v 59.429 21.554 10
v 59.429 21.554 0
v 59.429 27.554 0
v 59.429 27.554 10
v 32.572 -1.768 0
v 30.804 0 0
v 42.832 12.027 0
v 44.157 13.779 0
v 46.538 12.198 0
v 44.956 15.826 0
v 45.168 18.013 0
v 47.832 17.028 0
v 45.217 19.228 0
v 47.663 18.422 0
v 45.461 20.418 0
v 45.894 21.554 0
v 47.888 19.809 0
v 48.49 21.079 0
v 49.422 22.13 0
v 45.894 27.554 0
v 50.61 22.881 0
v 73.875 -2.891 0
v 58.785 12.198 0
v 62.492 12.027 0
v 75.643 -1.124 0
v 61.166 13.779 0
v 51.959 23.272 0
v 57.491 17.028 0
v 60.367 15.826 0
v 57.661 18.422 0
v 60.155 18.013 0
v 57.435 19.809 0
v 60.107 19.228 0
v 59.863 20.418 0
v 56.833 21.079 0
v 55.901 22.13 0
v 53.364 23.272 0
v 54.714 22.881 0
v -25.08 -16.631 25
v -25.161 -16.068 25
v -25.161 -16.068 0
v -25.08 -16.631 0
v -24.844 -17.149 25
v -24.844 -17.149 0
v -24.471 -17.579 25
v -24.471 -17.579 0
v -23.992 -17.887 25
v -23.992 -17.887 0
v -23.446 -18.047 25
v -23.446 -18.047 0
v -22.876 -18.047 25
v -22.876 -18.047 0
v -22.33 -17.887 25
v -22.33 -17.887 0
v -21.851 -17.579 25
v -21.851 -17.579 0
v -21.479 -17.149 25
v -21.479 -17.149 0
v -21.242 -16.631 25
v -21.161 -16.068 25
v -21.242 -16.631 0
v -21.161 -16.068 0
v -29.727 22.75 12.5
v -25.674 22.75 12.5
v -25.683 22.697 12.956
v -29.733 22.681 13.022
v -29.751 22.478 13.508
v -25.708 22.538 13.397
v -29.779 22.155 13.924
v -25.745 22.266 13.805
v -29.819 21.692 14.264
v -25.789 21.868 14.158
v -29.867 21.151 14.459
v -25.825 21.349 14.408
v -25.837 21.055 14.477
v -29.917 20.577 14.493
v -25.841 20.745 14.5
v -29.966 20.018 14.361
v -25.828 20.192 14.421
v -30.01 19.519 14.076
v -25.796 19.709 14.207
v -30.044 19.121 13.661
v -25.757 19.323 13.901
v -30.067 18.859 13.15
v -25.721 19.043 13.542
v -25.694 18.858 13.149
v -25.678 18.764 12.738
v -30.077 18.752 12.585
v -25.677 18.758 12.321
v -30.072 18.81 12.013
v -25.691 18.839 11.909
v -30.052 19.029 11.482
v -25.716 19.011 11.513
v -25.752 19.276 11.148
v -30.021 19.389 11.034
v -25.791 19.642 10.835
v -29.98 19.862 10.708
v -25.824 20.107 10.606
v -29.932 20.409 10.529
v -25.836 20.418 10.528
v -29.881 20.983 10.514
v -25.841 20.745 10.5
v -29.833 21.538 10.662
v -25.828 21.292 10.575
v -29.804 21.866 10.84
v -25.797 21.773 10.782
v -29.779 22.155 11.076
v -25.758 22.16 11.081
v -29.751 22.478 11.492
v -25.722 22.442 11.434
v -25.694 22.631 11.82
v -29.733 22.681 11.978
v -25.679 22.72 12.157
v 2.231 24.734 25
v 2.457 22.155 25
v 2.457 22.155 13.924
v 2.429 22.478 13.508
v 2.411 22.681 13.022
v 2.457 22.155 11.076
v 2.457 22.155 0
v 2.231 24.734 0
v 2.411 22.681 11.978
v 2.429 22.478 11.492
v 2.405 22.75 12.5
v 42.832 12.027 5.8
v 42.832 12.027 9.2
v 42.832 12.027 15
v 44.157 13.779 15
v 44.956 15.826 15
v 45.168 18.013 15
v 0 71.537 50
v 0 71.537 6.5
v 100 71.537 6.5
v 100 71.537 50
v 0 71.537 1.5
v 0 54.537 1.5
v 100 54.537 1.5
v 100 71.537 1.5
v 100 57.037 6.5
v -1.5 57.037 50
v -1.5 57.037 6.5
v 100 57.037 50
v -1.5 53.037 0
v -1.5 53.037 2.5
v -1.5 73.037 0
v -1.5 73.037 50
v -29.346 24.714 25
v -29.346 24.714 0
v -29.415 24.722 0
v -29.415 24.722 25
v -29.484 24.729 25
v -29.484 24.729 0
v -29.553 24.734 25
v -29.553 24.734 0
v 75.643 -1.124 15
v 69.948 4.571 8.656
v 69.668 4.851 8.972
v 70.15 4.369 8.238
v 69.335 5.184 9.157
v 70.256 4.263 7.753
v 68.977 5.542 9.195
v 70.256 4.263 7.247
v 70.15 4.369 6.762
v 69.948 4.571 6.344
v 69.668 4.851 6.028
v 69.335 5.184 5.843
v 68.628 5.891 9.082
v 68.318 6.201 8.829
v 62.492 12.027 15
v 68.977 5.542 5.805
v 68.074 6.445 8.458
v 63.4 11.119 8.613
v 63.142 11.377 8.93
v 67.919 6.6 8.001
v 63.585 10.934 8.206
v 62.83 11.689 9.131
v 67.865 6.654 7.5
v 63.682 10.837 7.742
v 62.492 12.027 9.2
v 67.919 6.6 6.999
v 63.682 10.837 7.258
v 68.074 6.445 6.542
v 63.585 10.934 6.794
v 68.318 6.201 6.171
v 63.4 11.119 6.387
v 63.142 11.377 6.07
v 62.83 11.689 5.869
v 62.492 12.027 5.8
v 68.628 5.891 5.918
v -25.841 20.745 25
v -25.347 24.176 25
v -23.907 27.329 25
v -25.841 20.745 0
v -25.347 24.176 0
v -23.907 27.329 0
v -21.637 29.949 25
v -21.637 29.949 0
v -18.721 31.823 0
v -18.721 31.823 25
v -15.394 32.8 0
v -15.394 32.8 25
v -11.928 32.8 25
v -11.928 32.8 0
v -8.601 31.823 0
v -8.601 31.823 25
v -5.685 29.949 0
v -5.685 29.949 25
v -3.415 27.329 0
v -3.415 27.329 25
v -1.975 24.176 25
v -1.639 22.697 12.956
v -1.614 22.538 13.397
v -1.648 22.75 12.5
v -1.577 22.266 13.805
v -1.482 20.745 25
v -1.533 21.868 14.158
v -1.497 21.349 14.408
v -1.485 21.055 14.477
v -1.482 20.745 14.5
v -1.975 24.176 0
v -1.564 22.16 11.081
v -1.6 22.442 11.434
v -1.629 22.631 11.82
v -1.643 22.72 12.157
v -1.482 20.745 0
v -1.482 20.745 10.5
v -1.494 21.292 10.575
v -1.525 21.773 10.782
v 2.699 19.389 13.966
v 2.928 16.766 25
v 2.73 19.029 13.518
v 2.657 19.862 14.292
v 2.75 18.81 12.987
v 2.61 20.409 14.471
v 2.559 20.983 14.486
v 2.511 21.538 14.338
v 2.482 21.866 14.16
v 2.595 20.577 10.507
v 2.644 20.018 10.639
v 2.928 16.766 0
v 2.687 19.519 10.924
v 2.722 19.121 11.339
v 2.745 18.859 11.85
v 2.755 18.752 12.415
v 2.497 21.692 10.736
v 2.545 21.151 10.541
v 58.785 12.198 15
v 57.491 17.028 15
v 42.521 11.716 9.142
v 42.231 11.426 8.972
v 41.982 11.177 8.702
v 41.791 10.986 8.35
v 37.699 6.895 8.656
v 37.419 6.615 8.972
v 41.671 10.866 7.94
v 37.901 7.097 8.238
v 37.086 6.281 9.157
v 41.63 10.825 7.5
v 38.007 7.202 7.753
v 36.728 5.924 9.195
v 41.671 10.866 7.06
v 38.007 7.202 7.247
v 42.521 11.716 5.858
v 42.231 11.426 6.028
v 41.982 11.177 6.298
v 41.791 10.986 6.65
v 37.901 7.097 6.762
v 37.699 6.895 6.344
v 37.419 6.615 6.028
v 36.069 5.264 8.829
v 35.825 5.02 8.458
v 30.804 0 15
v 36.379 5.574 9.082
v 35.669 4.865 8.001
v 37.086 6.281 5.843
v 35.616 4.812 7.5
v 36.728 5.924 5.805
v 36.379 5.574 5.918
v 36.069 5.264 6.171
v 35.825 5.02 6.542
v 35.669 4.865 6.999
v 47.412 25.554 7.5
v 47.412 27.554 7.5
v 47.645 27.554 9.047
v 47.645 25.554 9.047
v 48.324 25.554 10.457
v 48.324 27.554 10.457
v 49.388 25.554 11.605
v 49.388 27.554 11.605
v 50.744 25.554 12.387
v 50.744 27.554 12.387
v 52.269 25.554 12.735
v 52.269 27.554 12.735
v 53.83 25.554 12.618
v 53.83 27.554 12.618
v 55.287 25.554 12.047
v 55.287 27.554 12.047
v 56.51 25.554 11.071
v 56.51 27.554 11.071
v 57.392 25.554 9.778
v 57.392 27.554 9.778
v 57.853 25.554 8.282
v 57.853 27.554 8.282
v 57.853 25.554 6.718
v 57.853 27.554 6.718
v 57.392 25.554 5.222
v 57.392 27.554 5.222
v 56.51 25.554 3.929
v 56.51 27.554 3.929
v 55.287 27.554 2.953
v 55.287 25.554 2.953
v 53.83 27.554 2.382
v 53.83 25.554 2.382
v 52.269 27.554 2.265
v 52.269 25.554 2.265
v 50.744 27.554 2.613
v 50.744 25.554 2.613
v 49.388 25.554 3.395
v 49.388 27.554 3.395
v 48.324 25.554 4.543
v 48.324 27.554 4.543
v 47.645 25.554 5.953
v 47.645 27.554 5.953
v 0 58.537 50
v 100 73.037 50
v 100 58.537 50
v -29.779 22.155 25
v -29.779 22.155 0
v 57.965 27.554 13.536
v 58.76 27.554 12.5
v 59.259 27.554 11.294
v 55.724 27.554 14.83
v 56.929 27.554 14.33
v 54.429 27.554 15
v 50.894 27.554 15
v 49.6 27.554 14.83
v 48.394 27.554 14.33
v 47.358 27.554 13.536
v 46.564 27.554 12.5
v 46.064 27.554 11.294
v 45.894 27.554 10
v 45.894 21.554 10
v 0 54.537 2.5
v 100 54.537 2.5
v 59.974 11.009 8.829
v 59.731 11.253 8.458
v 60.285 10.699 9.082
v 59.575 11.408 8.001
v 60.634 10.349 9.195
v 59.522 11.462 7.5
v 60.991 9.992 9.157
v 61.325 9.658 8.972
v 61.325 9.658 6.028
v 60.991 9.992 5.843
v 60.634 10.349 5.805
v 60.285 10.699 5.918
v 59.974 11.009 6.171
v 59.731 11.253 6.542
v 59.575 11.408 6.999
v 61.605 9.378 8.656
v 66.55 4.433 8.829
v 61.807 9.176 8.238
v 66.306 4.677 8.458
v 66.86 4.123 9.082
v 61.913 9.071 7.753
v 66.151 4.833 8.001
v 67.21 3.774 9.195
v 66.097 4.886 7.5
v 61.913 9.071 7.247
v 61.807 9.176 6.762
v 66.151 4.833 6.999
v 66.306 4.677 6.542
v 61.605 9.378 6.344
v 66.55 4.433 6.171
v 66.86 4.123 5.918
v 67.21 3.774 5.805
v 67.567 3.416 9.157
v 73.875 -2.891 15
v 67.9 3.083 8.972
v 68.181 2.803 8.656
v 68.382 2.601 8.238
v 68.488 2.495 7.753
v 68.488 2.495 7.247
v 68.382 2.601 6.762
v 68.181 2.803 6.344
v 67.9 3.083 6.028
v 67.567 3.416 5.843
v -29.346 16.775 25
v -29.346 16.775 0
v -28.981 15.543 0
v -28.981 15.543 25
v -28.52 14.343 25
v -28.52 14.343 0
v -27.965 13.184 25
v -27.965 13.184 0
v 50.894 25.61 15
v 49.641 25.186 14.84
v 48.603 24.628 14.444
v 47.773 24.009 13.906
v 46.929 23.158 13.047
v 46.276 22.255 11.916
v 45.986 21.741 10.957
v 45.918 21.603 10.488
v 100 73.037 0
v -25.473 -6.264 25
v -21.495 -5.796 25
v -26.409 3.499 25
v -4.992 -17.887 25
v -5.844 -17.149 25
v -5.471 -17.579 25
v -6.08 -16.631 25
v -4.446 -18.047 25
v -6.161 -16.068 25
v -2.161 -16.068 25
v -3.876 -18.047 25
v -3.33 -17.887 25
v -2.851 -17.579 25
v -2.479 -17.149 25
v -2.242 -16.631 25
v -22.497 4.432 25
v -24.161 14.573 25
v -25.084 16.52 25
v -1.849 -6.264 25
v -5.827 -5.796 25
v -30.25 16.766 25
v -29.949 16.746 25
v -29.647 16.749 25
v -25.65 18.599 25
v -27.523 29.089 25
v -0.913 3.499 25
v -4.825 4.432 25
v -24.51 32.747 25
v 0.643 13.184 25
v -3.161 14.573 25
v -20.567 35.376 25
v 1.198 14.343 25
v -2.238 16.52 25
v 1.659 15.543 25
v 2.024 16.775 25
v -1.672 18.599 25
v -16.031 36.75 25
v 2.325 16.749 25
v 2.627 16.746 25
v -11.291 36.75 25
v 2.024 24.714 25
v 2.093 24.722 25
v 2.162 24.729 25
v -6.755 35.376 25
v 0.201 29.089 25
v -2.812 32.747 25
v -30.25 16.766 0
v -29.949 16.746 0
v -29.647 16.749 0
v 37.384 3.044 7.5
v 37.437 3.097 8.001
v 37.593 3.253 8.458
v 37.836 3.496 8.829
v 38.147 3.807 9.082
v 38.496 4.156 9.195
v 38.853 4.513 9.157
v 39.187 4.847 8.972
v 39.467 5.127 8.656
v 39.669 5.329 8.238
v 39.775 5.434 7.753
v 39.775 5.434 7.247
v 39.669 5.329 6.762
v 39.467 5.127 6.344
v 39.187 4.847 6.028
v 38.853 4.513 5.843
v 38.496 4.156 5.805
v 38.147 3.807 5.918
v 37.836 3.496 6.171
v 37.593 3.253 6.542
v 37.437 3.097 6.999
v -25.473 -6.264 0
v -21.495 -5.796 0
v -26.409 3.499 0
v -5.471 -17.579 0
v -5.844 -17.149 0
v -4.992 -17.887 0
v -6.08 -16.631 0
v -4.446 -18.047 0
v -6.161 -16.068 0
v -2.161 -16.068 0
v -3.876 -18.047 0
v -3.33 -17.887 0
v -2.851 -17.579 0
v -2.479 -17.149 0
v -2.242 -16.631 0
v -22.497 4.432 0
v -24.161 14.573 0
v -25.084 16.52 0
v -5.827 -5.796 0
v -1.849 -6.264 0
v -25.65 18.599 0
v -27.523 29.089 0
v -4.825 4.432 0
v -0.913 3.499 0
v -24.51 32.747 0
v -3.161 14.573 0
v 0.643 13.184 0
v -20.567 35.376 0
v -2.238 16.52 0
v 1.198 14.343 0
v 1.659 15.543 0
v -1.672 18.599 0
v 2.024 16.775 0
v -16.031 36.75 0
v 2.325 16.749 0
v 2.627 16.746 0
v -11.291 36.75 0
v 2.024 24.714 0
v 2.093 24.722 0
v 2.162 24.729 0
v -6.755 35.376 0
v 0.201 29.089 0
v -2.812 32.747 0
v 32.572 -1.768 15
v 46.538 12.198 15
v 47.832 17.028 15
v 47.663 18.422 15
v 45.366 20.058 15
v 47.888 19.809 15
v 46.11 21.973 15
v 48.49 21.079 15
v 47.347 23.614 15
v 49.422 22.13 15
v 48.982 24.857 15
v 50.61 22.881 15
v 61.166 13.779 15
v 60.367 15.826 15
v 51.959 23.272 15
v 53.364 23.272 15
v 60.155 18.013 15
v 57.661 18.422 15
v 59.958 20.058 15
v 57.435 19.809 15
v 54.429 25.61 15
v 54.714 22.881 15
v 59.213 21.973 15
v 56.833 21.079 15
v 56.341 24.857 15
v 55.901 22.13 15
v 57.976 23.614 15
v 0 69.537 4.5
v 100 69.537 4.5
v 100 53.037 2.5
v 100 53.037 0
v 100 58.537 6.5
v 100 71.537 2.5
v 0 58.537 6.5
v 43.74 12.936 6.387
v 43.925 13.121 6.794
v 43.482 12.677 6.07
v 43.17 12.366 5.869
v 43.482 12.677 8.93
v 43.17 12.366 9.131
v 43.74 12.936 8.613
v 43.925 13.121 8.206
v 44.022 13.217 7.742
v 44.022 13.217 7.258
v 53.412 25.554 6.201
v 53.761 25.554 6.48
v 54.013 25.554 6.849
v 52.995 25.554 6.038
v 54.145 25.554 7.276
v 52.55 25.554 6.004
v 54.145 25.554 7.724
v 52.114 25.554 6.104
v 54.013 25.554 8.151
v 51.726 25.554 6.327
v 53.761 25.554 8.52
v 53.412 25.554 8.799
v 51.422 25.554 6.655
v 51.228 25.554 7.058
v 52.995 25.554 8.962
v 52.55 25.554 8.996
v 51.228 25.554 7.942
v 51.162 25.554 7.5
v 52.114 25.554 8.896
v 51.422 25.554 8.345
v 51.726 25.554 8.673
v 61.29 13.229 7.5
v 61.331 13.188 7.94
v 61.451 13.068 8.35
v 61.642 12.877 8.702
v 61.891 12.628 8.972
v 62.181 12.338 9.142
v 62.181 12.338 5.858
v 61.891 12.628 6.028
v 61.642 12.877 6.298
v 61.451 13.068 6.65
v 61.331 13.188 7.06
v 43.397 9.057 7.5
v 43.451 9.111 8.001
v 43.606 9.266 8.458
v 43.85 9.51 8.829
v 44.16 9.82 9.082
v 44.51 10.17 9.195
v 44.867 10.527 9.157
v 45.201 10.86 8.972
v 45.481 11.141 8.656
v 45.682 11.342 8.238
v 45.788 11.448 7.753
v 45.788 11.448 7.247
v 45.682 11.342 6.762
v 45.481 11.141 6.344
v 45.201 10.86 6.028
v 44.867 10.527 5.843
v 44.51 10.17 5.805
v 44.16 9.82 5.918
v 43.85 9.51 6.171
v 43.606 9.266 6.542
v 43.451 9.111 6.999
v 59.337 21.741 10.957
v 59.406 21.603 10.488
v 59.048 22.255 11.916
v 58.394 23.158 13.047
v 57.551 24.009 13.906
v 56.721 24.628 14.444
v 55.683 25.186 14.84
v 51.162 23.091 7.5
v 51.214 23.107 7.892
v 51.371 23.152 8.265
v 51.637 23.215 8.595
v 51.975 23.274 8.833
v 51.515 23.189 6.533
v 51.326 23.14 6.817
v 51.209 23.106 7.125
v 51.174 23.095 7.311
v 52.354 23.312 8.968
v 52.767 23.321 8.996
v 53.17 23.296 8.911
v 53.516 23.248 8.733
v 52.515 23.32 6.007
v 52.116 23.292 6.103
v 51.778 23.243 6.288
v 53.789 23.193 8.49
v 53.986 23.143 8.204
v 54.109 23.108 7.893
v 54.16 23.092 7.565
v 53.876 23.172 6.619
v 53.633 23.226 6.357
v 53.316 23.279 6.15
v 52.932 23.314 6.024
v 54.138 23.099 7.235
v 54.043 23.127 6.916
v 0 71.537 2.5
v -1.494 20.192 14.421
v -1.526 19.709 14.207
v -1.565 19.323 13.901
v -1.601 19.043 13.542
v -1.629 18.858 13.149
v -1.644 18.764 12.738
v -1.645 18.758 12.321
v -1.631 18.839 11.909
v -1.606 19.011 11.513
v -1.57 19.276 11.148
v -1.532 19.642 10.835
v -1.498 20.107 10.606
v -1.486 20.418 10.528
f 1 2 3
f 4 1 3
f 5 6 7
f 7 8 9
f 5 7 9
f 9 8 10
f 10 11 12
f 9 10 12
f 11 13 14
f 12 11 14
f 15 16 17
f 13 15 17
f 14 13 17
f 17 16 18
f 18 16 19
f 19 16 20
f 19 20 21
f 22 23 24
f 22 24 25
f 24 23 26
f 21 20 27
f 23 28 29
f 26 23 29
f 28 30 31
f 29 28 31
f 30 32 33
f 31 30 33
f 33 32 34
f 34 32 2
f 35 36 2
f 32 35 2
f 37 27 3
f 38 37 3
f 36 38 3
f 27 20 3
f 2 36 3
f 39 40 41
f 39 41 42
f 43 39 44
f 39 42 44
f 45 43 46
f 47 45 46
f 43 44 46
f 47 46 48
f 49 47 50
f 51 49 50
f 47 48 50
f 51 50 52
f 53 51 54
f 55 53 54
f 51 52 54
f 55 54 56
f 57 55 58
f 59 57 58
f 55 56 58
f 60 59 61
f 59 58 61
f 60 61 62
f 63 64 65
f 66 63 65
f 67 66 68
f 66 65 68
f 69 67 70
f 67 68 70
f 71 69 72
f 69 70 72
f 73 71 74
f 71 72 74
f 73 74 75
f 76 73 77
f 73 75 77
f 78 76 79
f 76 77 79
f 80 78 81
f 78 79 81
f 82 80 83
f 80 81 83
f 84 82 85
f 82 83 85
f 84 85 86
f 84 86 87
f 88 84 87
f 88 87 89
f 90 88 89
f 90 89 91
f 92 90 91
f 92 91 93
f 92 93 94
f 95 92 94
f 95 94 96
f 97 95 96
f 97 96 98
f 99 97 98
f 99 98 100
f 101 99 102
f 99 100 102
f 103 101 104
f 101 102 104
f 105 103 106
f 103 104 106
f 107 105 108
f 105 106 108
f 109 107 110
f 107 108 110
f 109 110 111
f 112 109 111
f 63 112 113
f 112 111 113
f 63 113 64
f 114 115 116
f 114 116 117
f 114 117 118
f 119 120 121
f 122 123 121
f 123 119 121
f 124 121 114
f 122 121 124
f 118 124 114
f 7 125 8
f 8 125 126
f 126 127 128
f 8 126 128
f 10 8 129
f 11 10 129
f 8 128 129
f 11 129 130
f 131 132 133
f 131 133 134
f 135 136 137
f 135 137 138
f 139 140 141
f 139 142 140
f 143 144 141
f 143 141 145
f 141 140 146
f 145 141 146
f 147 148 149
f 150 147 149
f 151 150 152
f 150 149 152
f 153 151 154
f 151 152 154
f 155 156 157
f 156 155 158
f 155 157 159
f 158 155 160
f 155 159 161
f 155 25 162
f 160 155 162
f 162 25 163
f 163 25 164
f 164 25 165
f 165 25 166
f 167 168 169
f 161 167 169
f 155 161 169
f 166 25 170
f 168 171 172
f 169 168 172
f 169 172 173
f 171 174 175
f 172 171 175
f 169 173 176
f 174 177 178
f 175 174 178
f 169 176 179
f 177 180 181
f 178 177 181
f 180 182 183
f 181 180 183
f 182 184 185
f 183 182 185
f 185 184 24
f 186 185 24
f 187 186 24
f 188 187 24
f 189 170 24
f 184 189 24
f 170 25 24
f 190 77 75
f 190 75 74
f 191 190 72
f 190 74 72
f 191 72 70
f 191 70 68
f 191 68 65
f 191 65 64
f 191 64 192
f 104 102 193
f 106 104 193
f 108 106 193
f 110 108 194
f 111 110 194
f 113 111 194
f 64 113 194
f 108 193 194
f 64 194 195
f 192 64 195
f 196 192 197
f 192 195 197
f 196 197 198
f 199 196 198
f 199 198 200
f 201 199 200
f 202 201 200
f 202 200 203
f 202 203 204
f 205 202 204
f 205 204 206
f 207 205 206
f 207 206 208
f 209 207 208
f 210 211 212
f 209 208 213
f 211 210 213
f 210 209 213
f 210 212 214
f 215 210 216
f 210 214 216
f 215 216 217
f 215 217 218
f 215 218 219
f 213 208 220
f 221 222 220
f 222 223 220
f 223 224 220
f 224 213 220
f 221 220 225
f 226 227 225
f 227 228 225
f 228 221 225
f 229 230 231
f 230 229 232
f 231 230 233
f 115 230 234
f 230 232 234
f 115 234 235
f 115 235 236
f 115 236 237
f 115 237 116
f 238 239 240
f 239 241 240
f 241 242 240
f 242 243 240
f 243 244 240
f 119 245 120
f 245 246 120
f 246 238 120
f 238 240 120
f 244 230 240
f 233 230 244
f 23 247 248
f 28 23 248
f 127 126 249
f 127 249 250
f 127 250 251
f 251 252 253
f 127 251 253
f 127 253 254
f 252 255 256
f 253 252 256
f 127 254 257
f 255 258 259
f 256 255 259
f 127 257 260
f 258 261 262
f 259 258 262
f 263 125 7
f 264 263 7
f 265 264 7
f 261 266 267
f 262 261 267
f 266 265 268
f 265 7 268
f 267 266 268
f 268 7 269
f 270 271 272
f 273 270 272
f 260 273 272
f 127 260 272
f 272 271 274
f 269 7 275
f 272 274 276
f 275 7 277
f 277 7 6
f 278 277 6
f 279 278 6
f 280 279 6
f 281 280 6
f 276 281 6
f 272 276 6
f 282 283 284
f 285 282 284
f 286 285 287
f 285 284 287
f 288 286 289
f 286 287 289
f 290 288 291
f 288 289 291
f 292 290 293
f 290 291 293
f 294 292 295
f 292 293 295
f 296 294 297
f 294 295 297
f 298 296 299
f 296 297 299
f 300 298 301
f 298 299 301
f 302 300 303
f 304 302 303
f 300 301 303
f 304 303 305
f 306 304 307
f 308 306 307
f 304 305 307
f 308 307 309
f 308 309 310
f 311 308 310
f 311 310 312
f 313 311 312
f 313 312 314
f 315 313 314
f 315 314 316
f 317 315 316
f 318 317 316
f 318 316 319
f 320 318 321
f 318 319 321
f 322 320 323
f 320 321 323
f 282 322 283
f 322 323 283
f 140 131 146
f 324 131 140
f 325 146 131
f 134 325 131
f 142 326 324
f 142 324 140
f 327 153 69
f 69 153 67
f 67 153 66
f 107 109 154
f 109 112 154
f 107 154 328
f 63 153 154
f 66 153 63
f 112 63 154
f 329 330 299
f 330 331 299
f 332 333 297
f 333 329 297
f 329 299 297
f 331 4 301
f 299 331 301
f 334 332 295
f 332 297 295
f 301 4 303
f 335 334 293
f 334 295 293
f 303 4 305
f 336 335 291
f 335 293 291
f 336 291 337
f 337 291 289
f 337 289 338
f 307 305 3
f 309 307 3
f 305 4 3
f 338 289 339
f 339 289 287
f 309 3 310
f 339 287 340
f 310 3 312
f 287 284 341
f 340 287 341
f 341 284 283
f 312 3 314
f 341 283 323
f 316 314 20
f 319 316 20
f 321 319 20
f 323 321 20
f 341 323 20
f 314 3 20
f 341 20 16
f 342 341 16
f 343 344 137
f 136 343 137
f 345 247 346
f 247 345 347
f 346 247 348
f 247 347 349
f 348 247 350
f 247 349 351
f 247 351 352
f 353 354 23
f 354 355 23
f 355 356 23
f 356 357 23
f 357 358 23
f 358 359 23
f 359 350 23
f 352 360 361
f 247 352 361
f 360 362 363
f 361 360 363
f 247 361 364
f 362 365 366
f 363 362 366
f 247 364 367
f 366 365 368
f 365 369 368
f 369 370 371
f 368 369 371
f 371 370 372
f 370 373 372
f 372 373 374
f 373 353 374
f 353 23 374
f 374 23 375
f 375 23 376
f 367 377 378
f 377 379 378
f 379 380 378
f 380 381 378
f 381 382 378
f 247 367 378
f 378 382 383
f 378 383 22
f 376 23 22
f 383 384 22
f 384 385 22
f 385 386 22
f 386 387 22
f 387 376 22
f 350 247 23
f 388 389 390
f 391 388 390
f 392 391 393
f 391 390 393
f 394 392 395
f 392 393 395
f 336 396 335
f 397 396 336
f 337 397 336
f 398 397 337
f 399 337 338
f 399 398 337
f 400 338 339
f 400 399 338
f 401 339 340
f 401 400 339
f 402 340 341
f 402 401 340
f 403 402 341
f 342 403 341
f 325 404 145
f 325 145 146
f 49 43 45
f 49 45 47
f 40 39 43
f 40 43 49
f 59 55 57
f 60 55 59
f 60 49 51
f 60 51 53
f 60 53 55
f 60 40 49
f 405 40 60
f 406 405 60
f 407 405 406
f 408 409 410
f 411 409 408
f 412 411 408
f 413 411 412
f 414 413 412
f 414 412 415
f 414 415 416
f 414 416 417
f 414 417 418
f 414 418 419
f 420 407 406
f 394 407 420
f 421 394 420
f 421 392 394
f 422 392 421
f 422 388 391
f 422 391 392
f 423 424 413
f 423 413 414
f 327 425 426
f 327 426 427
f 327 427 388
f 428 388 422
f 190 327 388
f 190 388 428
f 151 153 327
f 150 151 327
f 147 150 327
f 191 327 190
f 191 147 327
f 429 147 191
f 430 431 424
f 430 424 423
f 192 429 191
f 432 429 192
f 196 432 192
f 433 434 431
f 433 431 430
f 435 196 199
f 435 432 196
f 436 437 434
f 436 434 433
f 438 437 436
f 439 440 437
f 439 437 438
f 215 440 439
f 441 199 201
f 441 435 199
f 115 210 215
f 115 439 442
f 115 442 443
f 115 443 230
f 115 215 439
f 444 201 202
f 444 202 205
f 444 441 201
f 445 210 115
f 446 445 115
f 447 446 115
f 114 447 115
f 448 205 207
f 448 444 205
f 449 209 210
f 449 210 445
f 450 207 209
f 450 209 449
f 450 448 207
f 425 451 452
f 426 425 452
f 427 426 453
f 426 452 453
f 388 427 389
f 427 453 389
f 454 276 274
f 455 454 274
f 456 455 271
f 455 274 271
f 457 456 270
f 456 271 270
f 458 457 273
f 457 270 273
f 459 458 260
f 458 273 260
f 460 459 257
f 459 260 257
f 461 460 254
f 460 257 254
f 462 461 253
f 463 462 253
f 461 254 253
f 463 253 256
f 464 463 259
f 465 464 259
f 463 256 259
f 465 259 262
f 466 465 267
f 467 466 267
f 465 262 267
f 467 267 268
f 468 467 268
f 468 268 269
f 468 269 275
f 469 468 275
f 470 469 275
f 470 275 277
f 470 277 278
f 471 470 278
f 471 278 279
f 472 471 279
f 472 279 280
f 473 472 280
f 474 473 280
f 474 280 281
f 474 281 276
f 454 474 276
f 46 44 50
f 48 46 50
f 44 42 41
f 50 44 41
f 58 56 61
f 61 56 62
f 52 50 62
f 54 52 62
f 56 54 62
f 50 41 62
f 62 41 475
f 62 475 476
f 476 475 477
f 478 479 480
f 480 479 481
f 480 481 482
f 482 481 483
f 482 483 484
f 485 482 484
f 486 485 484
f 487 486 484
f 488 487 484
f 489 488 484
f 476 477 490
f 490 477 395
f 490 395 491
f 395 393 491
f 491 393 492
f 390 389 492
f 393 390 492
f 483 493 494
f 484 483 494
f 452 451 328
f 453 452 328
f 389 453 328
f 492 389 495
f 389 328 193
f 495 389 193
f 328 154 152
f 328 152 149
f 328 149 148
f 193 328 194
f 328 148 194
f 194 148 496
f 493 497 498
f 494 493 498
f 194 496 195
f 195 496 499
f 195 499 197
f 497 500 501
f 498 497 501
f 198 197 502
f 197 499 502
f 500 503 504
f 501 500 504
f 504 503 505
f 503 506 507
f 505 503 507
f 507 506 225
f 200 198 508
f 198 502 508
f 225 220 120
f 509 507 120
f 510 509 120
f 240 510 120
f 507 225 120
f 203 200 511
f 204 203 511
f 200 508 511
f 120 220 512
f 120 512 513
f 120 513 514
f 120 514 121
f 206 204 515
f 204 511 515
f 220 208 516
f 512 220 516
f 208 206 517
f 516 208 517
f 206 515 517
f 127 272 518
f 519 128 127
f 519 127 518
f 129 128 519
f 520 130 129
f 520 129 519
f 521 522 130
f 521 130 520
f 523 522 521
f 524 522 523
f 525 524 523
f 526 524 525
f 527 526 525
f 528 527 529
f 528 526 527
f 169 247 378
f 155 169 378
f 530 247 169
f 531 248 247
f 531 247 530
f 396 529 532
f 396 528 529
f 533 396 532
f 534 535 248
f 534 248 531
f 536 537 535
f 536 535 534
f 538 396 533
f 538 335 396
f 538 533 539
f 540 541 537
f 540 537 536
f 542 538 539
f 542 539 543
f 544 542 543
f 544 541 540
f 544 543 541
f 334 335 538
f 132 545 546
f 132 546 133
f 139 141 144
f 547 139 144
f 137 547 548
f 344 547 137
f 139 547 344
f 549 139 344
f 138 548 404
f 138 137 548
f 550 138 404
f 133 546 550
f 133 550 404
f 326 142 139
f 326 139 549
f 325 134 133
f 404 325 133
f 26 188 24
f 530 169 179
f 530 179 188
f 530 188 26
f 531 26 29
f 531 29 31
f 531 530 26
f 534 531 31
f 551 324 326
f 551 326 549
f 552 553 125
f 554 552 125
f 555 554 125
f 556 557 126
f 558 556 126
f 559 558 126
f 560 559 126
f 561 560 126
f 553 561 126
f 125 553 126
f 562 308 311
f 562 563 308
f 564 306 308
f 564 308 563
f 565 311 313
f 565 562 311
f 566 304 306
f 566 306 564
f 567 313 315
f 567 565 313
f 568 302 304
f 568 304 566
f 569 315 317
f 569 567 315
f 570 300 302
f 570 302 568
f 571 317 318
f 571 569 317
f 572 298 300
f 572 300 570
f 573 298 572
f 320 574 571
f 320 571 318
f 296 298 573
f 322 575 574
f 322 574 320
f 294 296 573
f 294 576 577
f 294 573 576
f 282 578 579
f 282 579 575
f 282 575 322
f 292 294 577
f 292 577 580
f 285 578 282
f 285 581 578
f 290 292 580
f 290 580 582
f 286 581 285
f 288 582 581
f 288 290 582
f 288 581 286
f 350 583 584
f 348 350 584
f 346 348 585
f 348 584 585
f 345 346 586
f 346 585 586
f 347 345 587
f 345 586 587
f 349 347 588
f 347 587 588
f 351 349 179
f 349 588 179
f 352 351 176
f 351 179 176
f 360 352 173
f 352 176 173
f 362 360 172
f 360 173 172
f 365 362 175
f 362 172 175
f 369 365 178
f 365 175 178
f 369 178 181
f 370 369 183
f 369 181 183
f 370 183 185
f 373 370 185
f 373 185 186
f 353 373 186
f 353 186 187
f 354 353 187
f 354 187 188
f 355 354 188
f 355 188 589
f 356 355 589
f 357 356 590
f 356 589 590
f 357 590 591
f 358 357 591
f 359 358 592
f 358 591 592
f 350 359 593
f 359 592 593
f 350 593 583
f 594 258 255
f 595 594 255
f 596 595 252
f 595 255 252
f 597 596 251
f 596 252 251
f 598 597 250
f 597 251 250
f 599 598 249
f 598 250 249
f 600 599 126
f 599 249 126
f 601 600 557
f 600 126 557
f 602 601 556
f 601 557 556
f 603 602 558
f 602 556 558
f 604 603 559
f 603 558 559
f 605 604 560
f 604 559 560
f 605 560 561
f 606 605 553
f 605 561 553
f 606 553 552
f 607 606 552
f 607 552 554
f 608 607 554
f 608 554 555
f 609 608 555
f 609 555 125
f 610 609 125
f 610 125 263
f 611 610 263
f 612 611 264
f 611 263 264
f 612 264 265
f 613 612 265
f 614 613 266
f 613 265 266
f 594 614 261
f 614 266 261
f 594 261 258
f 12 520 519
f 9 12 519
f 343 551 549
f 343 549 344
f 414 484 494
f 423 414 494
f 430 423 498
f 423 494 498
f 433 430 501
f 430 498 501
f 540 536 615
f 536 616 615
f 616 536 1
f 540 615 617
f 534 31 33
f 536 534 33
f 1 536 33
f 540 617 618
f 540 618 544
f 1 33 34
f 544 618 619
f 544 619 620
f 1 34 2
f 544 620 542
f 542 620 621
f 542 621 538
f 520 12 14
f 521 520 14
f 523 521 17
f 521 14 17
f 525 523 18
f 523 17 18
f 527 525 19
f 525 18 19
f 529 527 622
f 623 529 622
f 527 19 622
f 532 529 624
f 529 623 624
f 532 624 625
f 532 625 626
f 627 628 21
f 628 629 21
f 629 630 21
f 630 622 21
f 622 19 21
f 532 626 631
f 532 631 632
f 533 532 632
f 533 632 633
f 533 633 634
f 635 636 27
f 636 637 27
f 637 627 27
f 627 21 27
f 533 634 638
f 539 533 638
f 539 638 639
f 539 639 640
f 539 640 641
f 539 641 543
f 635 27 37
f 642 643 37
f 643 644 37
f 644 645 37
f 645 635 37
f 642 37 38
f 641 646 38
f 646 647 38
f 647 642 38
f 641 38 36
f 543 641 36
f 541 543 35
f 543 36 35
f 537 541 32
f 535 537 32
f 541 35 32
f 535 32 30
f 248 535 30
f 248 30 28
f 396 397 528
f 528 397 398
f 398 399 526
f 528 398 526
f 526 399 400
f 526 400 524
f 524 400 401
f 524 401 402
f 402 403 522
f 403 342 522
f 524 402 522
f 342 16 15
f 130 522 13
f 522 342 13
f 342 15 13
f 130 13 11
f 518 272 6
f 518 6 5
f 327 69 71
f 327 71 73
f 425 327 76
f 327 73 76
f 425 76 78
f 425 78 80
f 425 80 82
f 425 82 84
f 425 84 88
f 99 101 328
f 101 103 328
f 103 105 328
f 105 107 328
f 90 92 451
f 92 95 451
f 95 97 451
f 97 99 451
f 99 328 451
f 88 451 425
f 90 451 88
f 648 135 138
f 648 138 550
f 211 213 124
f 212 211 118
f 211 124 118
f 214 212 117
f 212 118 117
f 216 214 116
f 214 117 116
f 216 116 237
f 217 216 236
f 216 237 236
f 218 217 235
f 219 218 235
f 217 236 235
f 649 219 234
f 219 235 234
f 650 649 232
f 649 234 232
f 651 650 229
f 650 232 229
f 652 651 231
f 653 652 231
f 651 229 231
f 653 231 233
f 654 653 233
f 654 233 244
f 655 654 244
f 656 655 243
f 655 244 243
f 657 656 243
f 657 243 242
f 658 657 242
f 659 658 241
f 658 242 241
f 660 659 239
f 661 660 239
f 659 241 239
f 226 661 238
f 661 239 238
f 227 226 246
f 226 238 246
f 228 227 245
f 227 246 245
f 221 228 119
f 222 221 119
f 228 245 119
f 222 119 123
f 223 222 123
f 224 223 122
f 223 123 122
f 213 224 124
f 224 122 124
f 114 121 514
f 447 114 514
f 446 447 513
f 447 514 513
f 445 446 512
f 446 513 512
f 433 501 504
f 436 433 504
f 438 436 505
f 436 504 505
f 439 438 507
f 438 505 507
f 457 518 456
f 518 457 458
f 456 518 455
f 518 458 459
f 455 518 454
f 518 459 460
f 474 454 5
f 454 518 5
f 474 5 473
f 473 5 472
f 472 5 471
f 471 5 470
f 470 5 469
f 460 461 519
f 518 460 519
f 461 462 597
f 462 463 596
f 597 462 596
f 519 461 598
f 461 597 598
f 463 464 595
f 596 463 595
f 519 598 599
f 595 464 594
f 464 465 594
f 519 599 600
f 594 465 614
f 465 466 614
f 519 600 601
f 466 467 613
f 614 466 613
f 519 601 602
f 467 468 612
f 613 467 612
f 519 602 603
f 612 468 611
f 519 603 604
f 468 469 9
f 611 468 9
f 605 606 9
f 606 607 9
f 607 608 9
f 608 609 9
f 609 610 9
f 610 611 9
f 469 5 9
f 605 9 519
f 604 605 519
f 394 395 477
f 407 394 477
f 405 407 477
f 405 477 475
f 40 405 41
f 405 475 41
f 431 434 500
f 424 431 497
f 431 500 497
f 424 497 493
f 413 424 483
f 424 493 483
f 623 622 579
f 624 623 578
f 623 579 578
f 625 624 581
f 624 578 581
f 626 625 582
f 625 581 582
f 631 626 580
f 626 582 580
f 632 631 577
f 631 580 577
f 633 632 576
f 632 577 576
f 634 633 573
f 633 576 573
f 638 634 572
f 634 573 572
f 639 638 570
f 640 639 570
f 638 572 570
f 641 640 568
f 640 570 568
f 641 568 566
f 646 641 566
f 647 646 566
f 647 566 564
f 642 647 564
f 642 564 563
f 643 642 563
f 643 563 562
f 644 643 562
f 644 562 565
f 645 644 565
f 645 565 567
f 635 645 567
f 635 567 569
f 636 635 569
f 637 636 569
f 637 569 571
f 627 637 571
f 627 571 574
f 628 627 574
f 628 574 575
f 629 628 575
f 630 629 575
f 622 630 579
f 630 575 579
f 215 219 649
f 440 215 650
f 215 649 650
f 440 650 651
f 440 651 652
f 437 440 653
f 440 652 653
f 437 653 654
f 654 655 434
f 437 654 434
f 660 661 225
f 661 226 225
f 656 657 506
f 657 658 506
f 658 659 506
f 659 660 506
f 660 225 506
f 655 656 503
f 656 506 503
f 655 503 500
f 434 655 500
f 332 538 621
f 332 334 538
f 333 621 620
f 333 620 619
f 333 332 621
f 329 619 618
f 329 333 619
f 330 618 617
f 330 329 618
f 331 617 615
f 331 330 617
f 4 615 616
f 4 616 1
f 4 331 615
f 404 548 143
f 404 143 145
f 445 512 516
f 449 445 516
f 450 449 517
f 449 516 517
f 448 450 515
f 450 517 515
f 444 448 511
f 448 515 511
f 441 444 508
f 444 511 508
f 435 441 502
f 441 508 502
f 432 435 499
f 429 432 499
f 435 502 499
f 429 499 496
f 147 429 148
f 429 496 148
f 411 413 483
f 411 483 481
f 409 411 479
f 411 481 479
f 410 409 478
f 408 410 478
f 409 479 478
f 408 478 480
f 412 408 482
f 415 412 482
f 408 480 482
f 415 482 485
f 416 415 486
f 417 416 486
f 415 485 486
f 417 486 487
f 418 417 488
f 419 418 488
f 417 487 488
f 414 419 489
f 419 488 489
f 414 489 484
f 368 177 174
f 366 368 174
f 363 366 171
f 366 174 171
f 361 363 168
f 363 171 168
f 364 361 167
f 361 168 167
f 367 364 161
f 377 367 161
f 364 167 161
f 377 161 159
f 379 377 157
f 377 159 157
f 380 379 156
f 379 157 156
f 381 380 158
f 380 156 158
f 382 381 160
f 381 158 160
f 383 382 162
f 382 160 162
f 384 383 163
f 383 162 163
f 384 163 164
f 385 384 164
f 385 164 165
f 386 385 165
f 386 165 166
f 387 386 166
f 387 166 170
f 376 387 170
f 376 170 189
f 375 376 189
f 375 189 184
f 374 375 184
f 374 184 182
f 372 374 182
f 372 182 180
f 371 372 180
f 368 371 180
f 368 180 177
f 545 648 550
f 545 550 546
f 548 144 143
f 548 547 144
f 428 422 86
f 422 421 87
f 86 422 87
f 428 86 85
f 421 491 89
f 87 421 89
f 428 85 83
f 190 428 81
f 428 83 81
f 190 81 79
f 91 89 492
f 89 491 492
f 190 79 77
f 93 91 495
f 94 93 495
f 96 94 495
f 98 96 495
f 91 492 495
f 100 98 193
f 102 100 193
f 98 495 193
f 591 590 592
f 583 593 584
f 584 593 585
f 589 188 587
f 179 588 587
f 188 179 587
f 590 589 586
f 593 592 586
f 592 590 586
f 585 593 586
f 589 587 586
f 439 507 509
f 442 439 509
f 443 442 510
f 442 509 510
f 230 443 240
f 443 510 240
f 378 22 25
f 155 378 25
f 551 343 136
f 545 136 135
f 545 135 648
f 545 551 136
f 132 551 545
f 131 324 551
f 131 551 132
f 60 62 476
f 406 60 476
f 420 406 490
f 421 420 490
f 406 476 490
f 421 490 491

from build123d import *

# Parameters (mm, degrees)
F1_DEPTH         = 25
F2_R             = 2
F3_DEPTH         = 50
F3_DEPTH_BACK    = 25
F5_DEPTH         = 15
F6_R             = 5.25
F6_R_2           = 1.5
F7_DEPTH         = 2
F8_DEPTH         = 4.4635371399
F9_R             = 8
F10_T1_DEPTH     = 34.1738160091
F11_R            = 5
F14_D            = 3.4
F14_DEPTH        = 33.751
F14_ON_F12_D     = 3.4
F14_ON_F12_DEPTH = 32.9564066504
F16_DEPTH        = 100
F16_DEPTH_BACK   = 1.5
F17_DEPTH        = 100


# Not quite as in the source:
# - a fillet or chamfer that OpenCascade refuses, or shapes differently, is made with other operations: its cross-section is extruded or revolved along the edge and cut away or added


with BuildPart() as f1:
    # F0 (on Top) → F1 (new body)
    with BuildSketch(Plane.XY):
        with BuildLine():
            ThreePointArc((-24.161032021, 14.5729538053), (-25.4131452814, 17.5465819672), (-25.8405137163, 20.7446451753))
            ThreePointArc((-25.8405137163, 20.7446451753), (-26.8423631476, 18.0967982826), (-29.3460602999, 16.7753233416))
            ThreePointArc((-29.3460602999, 16.7753233416), (-28.7627184296, 14.9382094746), (-27.9650444616, 13.1835039897))
            ThreePointArc((-27.9650444616, 13.1835039897), (-25.8636381782, -1.3750118355), (-25.161032021, -16.0676166415))
            ThreePointArc((-25.161032021, -16.0676166415), (-23.161032021, -18.0676166415), (-21.161032021, -16.0676166415))
            ThreePointArc((-21.161032021, -16.0676166415), (-21.9128208792, -0.6740745109), (-24.161032021, 14.5729538053))
        make_face()
        with BuildLine():
            ThreePointArc((2.0239962578, 16.7753233416), (-0.4797008945, 18.0967982826), (-1.4815503258, 20.7446451753))
            ThreePointArc((-1.4815503258, 20.7446451753), (-1.9089187607, 17.5465819672), (-3.161032021, 14.5729538053))
            ThreePointArc((-3.161032021, 14.5729538053), (-5.4092431629, -0.6740745109), (-6.161032021, -16.0676166415))
            ThreePointArc((-6.161032021, -16.0676166415), (-4.161032021, -18.0676166415), (-2.161032021, -16.0676166415))
            ThreePointArc((-2.161032021, -16.0676166415), (-1.4584258639, -1.3750118355), (0.6429804195, 13.1835039897))
            ThreePointArc((0.6429804195, 13.1835039897), (1.4406543875, 14.9382094746), (2.0239962578, 16.7753233416))
        make_face()
        with BuildLine():
            ThreePointArc((-29.3460602999, 24.7139670089), (-26.8423631476, 23.392492068), (-25.8405137163, 20.7446451753))
            ThreePointArc((-25.8405137163, 20.7446451753), (-13.661032021, 32.9241268706), (-1.4815503258, 20.7446451753))
            ThreePointArc((-1.4815503258, 20.7446451753), (-0.4797008945, 23.392492068), (2.0239962578, 24.7139670089))
            ThreePointArc((2.0239962578, 24.7139670089), (-13.661032021, 36.9241268706), (-29.3460602999, 24.7139670089))
        make_face()
        with BuildLine():
            ThreePointArc((2.2312015307, 24.7343179067), (2.1274664624, 24.7254908302), (2.0239962578, 24.7139670089))
            ThreePointArc((2.0239962578, 24.7139670089), (2.2918404856, 23.4430681803), (2.4568818303, 22.1547802787))
            Line((2.4568818303, 22.1547802787), (2.2312015307, 24.7343179067))
        make_face()
        with BuildLine():
            ThreePointArc((-29.7789459209, 22.1547797242), (-29.6139045741, 23.4430679059), (-29.3460602999, 24.7139670089))
            ThreePointArc((-29.3460602999, 24.7139670089), (-29.4495305044, 24.7254908302), (-29.5532655728, 24.7343179067))
            Line((-29.5532655728, 24.7343179067), (-29.7789459209, 22.1547797242))
        make_face()
        with BuildLine():
            ThreePointArc((-30.2504289168, 16.7657044207), (-29.7979718734, 16.7448714077), (-29.3460602999, 16.7753233416))
            ThreePointArc((-29.3460602999, 16.7753233416), (-29.7883820994, 19.4468750185), (-29.7789459209, 22.1547797242))
            Line((-29.7789459209, 22.1547797242), (-30.2504289168, 16.7657044207))
        make_face()
        with BuildLine():
            ThreePointArc((2.4568818303, 22.1547802787), (2.4663180796, 19.4468752959), (2.0239962578, 16.7753233416))
            ThreePointArc((2.0239962578, 16.7753233416), (2.4759078313, 16.7448714077), (2.9283648747, 16.7657044207))
            Line((2.9283648747, 16.7657044207), (2.4568818303, 22.1547802787))
        make_face()
        with BuildLine():
            ThreePointArc((2.0239962578, 24.7139670089), (-0.4797008945, 23.392492068), (-1.4815503258, 20.7446451753))
            ThreePointArc((-1.4815503258, 20.7446451753), (-0.4797008945, 18.0967982826), (2.0239962578, 16.7753233416))
            ThreePointArc((2.0239962578, 16.7753233416), (2.4663180796, 19.4468752959), (2.4568818303, 22.1547802787))
            ThreePointArc((2.4568818303, 22.1547802787), (2.2918404856, 23.4430681803), (2.0239962578, 24.7139670089))
        make_face()
        with BuildLine():
            ThreePointArc((-29.3460602999, 16.7753233416), (-26.8423631476, 18.0967982826), (-25.8405137163, 20.7446451753))
            ThreePointArc((-25.8405137163, 20.7446451753), (-26.8423631476, 23.392492068), (-29.3460602999, 24.7139670089))
            ThreePointArc((-29.3460602999, 24.7139670089), (-29.6139045741, 23.4430679059), (-29.7789459209, 22.1547797242))
            ThreePointArc((-29.7789459209, 22.1547797242), (-29.7883820994, 19.4468750185), (-29.3460602999, 16.7753233416))
        make_face()
    extrude(amount=F1_DEPTH)

    # F2 (on Right) → F3 (cut, two sides)
    with BuildSketch(Plane.YZ) as f3_sk:
        with Locations((20.7500111637, 12.5)):
            Circle(F2_R)
    extrude(amount=-F3_DEPTH, mode=Mode.SUBTRACT)
    extrude(f3_sk.sketch, amount=F3_DEPTH_BACK, mode=Mode.SUBTRACT)


with BuildPart() as f5:
    # F4 (on Top) → F5 (new body)
    with BuildSketch(Plane.XY):
        with BuildLine():
            Line((30.8044720441, 0), (32.5722389971, -1.767766953))
            Line((32.5722389971, -1.767766953), (49.1261838352, 14.7861778852))
            ThreePointArc((49.1261838352, 14.7861778852), (52.6617177411, 23.3217117911), (56.1972516471, 14.7861778852))
            Line((56.1972516471, 14.7861778852), (73.8749211767, -2.8914916445))
            Line((73.8749211767, -2.8914916445), (75.6426881297, -1.1237246915))
            Line((75.6426881297, -1.1237246915), (59.4294846941, 15.0894787441))
            ThreePointArc((59.4294846941, 15.0894787441), (60.1617177411, 18.3217117911), (59.4294846941, 21.5539448381))
            ThreePointArc((59.4294846941, 21.5539448381), (56.6622334671, 24.6656753728), (52.6617177411, 25.8217117911))
            ThreePointArc((52.6617177411, 25.8217117911), (48.6612020152, 24.6656753728), (45.8939507882, 21.5539448381))
            ThreePointArc((45.8939507882, 21.5539448381), (45.1617177411, 18.3217117911), (45.8939507882, 15.0894787441))
            Line((45.8939507882, 15.0894787441), (30.8044720441, 0))
        make_face()
        with BuildLine():
            Line((45.8939507882, 25.8217117911), (45.8939507882, 21.5539448381))
            ThreePointArc((45.8939507882, 21.5539448381), (48.6612020152, 24.6656753728), (52.6617177411, 25.8217117911))
            Line((52.6617177411, 25.8217117911), (45.8939507882, 25.8217117911))
        make_face()
        with BuildLine():
            Line((45.8939507882, 25.8217117911), (52.6617177411, 25.8217117911))
            ThreePointArc((52.6617177411, 25.8217117911), (56.6622334671, 24.6656753728), (59.4294846941, 21.5539448381))
            Line((59.4294846941, 21.5539448381), (59.4294846941, 27.5539448381))
            Line((59.4294846941, 27.5539448381), (45.8939507882, 27.5539448381))
            Line((45.8939507882, 27.5539448381), (45.8939507882, 25.8217117911))
        make_face()
    extrude(amount=F5_DEPTH)

    # F6 (on face) → F7 (cut)
    with BuildSketch(Plane(origin=(0, 27.5539448381, 0), x_dir=(-1, 0, 0), z_dir=(0, 1, 0))):
        with Locations((-52.6617177411, 7.5)):
            Circle(F6_R)
        with Locations((-52.6617177411, 7.5)):
            Circle(F6_R_2, mode=Mode.SUBTRACT)
    extrude(amount=-F7_DEPTH, mode=Mode.SUBTRACT)

    # F8 (cut, through all): a face of the model
    f8_faces = [f5.faces().sort_by_distance(p)[0] for p in [
        (52.6617177411, 27.5539448381, 7.5),
    ]]
    extrude(f8_faces, amount=-F8_DEPTH, mode=Mode.SUBTRACT)

    # F9
    f9_edges = [f5.edges().sort_by_distance(p)[0] for p in [
        (59.429485, 15.089479, 7.5),
        (45.893951, 15.089479, 7.5),
    ]]
    fillet(f9_edges, radius=F9_R)

    # F10: chamfer of 5 on 2 edges, made by hand

    # F10_s2 → F10_t1 (cut)
    with BuildSketch(Plane.XY.offset(-9.5869080045)):
        with BuildLine():
            Line((58.7854420981, 12.1979874341), (57.4913468726, 17.0276165656))
            ThreePointArc((57.4913468726, 17.0276165656), (57.0285091449, 15.8863200699), (56.1972516471, 14.7861778852))
            Line((56.1972516471, 14.7861778852), (58.7854420981, 12.1979874341))
        make_face()
        with BuildLine():
            Line((47.8320886097, 17.0276165656), (46.5379933842, 12.1979874341))
            Line((46.5379933842, 12.1979874341), (49.1261838352, 14.7861778852))
            ThreePointArc((49.1261838352, 14.7861778852), (48.2949263373, 15.8863200699), (47.8320886097, 17.0276165656))
        make_face()
    extrude(amount=F10_T1_DEPTH, mode=Mode.SUBTRACT)

    # F11
    f11_edges = [f5.edges().sort_by_distance(p)[0] for p in [
        (45.893951, 24.553945, 15),
        (59.429485, 24.553945, 15),
    ]]
    fillet(f11_edges, radius=F11_R)

    # F14 (through all, one way)
    with BuildSketch(Plane(origin=(15.4022360221, -15.4022360221, 0), x_dir=(-0.7071067812, -0.7071067812, 0), z_dir=(-0.7071067812, 0.7071067812, 0))):
        with Locations((-38.7911101231, 7.5), (-30.2865805982, 7.5)):
            Circle(F14_D / 2)
    extrude(amount=-F14_DEPTH, mode=Mode.SUBTRACT)

    # F14 on F12 (through all, one way)
    with BuildSketch(Plane(origin=(37.2594817191, 37.2594817191, 0), x_dir=(-0.7071067812, 0.7071067812, 0), z_dir=(0.7071067812, 0.7071067812, 0))):
        with Locations((-35.6838053243, 7.5), (-44.9829281988, 7.5)):
            Circle(F14_ON_F12_D / 2)
    extrude(amount=-F14_ON_F12_DEPTH, mode=Mode.SUBTRACT)


with BuildPart() as f16:
    # F15 (on Right) → F16 (new body, two sides)
    with BuildSketch(Plane.YZ) as f16_sk:
        Polygon((53.036596626, 2.5), (53.036596626, 0), (73.036596626, 0), (73.036596626, 50), (71.536596626, 50), (71.536596626, 6.5), (71.536596626, 4.5), (71.536596626, 2.5), (71.536596626, 1.5), (54.536596626, 1.5), (54.536596626, 2.5), (56.536596626, 4.5), (58.536596626, 6.5), (58.536596626, 50), (57.036596626, 50), (57.036596626, 6.5), align=None)
        Polygon((71.536596626, 4.5), (71.536596626, 6.5), (69.536596626, 4.5), align=None)
        Polygon((71.536596626, 2.5), (71.536596626, 4.5), (69.536596626, 4.5), align=None)
        Polygon((71.536596626, 6.5), (71.536596626, 50), (58.536596626, 50), (58.536596626, 6.5), (56.536596626, 4.5), (54.536596626, 2.5), (54.536596626, 1.5), (71.536596626, 1.5), (71.536596626, 2.5), (69.536596626, 4.5), align=None)
    extrude(amount=F16_DEPTH)
    extrude(f16_sk.sketch, amount=-F16_DEPTH_BACK)

    # F15 (on Right) → F17 (cut)
    with BuildSketch(Plane.YZ):
        Polygon((71.536596626, 6.5), (71.536596626, 50), (58.536596626, 50), (58.536596626, 6.5), (56.536596626, 4.5), (54.536596626, 2.5), (54.536596626, 1.5), (71.536596626, 1.5), (71.536596626, 2.5), (69.536596626, 4.5), align=None)
    extrude(amount=F17_DEPTH, mode=Mode.SUBTRACT)


solid = Compound([f1.part, f5.part, f16.part])
